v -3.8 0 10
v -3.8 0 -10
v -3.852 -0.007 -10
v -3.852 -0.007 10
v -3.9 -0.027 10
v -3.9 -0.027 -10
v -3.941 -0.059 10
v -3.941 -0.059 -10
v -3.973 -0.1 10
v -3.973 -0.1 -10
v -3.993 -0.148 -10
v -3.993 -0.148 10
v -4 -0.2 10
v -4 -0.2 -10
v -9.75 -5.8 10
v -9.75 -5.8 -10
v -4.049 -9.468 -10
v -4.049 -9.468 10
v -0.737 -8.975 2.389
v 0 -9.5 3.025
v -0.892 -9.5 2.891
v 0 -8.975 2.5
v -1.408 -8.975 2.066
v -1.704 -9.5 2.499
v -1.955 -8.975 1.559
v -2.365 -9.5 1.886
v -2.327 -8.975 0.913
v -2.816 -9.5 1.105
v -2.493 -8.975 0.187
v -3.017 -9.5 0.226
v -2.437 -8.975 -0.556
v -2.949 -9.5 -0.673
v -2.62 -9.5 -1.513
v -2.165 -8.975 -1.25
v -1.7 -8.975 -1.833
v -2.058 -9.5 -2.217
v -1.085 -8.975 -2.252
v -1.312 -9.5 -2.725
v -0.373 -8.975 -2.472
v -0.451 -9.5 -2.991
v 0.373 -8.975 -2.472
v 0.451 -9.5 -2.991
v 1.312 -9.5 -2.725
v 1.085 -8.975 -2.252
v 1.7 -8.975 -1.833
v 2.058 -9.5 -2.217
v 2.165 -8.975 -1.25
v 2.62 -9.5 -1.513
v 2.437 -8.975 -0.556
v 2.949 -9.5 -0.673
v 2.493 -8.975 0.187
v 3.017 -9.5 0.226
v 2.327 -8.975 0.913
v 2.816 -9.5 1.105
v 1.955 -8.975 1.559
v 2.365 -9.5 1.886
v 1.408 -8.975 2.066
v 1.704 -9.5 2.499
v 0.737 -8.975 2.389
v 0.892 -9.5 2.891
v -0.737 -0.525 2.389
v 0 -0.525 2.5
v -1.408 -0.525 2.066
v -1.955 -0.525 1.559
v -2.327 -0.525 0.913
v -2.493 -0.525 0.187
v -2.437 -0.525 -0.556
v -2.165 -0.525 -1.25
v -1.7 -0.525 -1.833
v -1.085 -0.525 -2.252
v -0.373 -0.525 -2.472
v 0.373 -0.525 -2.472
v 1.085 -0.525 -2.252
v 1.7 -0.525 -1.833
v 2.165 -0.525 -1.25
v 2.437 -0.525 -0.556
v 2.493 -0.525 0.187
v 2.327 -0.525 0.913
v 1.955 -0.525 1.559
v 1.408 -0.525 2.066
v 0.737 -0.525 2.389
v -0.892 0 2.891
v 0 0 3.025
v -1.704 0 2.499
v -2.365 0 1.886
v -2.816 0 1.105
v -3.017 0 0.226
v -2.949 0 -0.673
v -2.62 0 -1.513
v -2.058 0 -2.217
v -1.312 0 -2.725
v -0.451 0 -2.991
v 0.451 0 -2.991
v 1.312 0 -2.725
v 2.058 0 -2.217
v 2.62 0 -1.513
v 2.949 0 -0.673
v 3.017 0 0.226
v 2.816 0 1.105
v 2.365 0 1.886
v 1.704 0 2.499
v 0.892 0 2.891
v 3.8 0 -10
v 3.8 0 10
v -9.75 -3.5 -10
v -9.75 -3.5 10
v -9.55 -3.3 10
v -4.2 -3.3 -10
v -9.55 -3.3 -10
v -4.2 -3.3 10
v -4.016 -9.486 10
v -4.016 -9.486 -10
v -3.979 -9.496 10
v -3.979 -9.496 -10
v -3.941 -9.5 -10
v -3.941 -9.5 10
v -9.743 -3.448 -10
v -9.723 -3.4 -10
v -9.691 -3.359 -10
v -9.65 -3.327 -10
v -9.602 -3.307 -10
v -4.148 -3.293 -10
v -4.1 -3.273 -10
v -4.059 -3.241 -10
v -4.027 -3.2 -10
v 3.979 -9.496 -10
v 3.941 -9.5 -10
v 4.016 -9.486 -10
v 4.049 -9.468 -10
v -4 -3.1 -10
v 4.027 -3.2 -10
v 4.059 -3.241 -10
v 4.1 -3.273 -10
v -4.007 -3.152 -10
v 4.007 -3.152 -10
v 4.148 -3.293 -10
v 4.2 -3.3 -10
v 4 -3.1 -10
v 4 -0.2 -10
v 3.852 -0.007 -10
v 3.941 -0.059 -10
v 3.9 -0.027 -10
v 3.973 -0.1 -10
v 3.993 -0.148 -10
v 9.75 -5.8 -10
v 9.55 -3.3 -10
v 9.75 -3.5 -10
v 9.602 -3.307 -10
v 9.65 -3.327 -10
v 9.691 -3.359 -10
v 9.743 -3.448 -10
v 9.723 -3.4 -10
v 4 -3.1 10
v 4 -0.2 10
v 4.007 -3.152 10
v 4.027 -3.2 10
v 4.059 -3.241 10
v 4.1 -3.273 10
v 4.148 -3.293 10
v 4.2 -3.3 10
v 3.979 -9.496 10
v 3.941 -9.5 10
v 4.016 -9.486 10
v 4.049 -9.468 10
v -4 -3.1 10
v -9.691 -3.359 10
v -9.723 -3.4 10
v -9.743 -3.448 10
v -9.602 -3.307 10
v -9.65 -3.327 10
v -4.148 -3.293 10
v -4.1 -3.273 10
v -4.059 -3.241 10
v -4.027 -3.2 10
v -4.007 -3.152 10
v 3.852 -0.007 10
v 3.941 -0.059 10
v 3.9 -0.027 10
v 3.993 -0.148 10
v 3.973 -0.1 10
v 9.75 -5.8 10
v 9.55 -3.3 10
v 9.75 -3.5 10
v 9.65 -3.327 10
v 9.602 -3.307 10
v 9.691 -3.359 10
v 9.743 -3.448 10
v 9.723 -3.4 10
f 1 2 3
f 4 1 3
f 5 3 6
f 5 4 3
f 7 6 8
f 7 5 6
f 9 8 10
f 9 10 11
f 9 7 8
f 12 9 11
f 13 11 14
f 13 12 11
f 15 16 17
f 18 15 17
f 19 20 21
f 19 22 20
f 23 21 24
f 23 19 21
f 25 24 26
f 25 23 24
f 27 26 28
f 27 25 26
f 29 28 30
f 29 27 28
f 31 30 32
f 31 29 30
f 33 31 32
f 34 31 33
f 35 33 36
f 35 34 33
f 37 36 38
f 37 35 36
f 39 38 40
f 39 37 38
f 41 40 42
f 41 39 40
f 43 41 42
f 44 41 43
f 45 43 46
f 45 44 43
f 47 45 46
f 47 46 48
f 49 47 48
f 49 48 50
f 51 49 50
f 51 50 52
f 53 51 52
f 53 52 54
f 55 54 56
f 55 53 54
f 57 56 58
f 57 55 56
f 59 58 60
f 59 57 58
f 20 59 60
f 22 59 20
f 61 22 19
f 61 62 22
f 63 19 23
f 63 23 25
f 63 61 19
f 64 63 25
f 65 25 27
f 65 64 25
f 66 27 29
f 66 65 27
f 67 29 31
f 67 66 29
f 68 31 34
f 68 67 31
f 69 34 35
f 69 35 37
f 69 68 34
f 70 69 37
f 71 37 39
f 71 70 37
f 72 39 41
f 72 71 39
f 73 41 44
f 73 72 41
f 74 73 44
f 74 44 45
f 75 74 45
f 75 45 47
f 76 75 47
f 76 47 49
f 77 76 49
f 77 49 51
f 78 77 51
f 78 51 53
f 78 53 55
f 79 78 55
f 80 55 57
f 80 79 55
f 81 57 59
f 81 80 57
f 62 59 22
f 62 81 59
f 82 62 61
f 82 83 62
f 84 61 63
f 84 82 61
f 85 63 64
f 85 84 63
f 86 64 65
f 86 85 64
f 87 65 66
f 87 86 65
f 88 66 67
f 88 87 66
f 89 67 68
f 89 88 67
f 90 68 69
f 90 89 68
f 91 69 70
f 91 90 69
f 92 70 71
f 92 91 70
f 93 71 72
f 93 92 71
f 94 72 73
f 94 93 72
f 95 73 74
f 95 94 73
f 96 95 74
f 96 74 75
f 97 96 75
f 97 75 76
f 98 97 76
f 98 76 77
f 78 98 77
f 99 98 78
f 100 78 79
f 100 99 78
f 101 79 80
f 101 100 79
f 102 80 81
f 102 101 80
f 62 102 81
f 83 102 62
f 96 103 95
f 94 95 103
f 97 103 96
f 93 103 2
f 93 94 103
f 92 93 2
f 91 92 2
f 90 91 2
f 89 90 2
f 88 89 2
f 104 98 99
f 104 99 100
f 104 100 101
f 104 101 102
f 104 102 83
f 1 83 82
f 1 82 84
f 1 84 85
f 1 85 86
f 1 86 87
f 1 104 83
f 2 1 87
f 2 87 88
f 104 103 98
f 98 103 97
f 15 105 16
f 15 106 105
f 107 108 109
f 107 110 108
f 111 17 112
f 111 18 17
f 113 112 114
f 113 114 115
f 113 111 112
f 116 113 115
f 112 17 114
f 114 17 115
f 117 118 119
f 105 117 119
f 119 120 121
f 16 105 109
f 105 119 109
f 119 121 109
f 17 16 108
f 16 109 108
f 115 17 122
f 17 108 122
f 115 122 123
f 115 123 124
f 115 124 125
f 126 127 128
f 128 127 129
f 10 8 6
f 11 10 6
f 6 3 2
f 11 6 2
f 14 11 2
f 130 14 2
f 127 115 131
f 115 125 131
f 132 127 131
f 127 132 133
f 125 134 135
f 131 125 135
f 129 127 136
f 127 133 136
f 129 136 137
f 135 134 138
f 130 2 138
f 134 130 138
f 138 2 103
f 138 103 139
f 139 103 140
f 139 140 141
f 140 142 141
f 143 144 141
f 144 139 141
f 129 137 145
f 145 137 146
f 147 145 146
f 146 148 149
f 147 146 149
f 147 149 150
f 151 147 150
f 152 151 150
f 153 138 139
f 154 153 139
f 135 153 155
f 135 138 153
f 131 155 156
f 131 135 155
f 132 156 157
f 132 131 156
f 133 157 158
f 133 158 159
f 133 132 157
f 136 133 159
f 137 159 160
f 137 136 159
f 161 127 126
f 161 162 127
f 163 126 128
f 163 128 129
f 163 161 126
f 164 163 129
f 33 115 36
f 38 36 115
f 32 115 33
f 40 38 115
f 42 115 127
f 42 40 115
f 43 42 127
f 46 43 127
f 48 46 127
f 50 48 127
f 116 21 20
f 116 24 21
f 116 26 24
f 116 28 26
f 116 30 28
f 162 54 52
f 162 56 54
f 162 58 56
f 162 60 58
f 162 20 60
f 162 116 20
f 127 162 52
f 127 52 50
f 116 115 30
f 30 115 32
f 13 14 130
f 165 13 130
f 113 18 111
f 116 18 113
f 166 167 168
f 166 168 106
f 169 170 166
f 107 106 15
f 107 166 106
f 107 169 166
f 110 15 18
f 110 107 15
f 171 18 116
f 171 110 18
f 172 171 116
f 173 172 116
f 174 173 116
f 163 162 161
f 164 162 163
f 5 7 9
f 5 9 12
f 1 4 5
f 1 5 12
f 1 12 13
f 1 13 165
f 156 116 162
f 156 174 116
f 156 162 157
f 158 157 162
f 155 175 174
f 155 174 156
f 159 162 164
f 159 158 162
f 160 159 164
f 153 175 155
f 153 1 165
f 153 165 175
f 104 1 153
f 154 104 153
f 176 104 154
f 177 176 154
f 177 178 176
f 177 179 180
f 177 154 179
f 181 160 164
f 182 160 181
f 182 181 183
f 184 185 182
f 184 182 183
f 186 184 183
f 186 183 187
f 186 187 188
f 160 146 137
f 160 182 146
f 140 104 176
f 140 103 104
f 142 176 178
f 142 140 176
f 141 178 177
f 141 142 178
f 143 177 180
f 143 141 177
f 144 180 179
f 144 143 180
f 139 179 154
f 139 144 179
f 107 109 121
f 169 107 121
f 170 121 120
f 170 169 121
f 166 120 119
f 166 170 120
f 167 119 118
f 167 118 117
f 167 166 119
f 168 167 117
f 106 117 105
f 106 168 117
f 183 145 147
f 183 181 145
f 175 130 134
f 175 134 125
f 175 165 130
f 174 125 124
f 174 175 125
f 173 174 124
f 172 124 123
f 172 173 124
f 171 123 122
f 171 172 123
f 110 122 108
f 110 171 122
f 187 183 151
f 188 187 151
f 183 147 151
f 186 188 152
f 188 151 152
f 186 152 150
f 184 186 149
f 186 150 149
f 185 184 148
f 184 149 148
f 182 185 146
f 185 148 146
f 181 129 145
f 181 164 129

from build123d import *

# Parameters (mm, degrees)
EXTRUDE_1_DEPTH = 10
FILLET_1_R      = 0.2


with BuildPart() as part:
    # Эскиз1 → Бобышка-Вытянуть1 (new body, symmetric)
    with BuildSketch(Plane.XY):
        Polygon((4, 0), (-4, 0), (-4, -3.3), (-9.75, -3.3), (-9.75, -5.8), (-4, -9.5), (4, -9.5), (9.75, -5.8), (9.75, -3.3), (4, -3.3), align=None)
    extrude(amount=EXTRUDE_1_DEPTH, both=True)

    # Эскиз4 → Отверстие обработанное метчиком M63 (revolve, cut)
    with BuildSketch(Plane(origin=(0, 0, 0), x_dir=(0, 0, 1), z_dir=(1, 0, 0))):
        Polygon((0, 0), (0, 9.5), (3.025, 9.5), (2.5, 8.975), (2.5, 0.525), (3.025, 0), align=None)
    revolve(axis=Axis((0, 6.35, 0), (0, -1, 0)), mode=Mode.SUBTRACT)

    # Скругление1
    fillet_1_edges = [part.edges().sort_by_distance(p)[0] for p in [
        (-4, 0, 0),
        (4, 0, 0),
        (4, -3.3, 0),
        (9.75, -3.3, 0),
        (4, -9.5, 0),
        (-4, -9.5, 0),
        (-9.75, -3.3, 0),
        (-4, -3.3, 0),
    ]]
    fillet(fillet_1_edges, radius=FILLET_1_R)


solid = part.part
